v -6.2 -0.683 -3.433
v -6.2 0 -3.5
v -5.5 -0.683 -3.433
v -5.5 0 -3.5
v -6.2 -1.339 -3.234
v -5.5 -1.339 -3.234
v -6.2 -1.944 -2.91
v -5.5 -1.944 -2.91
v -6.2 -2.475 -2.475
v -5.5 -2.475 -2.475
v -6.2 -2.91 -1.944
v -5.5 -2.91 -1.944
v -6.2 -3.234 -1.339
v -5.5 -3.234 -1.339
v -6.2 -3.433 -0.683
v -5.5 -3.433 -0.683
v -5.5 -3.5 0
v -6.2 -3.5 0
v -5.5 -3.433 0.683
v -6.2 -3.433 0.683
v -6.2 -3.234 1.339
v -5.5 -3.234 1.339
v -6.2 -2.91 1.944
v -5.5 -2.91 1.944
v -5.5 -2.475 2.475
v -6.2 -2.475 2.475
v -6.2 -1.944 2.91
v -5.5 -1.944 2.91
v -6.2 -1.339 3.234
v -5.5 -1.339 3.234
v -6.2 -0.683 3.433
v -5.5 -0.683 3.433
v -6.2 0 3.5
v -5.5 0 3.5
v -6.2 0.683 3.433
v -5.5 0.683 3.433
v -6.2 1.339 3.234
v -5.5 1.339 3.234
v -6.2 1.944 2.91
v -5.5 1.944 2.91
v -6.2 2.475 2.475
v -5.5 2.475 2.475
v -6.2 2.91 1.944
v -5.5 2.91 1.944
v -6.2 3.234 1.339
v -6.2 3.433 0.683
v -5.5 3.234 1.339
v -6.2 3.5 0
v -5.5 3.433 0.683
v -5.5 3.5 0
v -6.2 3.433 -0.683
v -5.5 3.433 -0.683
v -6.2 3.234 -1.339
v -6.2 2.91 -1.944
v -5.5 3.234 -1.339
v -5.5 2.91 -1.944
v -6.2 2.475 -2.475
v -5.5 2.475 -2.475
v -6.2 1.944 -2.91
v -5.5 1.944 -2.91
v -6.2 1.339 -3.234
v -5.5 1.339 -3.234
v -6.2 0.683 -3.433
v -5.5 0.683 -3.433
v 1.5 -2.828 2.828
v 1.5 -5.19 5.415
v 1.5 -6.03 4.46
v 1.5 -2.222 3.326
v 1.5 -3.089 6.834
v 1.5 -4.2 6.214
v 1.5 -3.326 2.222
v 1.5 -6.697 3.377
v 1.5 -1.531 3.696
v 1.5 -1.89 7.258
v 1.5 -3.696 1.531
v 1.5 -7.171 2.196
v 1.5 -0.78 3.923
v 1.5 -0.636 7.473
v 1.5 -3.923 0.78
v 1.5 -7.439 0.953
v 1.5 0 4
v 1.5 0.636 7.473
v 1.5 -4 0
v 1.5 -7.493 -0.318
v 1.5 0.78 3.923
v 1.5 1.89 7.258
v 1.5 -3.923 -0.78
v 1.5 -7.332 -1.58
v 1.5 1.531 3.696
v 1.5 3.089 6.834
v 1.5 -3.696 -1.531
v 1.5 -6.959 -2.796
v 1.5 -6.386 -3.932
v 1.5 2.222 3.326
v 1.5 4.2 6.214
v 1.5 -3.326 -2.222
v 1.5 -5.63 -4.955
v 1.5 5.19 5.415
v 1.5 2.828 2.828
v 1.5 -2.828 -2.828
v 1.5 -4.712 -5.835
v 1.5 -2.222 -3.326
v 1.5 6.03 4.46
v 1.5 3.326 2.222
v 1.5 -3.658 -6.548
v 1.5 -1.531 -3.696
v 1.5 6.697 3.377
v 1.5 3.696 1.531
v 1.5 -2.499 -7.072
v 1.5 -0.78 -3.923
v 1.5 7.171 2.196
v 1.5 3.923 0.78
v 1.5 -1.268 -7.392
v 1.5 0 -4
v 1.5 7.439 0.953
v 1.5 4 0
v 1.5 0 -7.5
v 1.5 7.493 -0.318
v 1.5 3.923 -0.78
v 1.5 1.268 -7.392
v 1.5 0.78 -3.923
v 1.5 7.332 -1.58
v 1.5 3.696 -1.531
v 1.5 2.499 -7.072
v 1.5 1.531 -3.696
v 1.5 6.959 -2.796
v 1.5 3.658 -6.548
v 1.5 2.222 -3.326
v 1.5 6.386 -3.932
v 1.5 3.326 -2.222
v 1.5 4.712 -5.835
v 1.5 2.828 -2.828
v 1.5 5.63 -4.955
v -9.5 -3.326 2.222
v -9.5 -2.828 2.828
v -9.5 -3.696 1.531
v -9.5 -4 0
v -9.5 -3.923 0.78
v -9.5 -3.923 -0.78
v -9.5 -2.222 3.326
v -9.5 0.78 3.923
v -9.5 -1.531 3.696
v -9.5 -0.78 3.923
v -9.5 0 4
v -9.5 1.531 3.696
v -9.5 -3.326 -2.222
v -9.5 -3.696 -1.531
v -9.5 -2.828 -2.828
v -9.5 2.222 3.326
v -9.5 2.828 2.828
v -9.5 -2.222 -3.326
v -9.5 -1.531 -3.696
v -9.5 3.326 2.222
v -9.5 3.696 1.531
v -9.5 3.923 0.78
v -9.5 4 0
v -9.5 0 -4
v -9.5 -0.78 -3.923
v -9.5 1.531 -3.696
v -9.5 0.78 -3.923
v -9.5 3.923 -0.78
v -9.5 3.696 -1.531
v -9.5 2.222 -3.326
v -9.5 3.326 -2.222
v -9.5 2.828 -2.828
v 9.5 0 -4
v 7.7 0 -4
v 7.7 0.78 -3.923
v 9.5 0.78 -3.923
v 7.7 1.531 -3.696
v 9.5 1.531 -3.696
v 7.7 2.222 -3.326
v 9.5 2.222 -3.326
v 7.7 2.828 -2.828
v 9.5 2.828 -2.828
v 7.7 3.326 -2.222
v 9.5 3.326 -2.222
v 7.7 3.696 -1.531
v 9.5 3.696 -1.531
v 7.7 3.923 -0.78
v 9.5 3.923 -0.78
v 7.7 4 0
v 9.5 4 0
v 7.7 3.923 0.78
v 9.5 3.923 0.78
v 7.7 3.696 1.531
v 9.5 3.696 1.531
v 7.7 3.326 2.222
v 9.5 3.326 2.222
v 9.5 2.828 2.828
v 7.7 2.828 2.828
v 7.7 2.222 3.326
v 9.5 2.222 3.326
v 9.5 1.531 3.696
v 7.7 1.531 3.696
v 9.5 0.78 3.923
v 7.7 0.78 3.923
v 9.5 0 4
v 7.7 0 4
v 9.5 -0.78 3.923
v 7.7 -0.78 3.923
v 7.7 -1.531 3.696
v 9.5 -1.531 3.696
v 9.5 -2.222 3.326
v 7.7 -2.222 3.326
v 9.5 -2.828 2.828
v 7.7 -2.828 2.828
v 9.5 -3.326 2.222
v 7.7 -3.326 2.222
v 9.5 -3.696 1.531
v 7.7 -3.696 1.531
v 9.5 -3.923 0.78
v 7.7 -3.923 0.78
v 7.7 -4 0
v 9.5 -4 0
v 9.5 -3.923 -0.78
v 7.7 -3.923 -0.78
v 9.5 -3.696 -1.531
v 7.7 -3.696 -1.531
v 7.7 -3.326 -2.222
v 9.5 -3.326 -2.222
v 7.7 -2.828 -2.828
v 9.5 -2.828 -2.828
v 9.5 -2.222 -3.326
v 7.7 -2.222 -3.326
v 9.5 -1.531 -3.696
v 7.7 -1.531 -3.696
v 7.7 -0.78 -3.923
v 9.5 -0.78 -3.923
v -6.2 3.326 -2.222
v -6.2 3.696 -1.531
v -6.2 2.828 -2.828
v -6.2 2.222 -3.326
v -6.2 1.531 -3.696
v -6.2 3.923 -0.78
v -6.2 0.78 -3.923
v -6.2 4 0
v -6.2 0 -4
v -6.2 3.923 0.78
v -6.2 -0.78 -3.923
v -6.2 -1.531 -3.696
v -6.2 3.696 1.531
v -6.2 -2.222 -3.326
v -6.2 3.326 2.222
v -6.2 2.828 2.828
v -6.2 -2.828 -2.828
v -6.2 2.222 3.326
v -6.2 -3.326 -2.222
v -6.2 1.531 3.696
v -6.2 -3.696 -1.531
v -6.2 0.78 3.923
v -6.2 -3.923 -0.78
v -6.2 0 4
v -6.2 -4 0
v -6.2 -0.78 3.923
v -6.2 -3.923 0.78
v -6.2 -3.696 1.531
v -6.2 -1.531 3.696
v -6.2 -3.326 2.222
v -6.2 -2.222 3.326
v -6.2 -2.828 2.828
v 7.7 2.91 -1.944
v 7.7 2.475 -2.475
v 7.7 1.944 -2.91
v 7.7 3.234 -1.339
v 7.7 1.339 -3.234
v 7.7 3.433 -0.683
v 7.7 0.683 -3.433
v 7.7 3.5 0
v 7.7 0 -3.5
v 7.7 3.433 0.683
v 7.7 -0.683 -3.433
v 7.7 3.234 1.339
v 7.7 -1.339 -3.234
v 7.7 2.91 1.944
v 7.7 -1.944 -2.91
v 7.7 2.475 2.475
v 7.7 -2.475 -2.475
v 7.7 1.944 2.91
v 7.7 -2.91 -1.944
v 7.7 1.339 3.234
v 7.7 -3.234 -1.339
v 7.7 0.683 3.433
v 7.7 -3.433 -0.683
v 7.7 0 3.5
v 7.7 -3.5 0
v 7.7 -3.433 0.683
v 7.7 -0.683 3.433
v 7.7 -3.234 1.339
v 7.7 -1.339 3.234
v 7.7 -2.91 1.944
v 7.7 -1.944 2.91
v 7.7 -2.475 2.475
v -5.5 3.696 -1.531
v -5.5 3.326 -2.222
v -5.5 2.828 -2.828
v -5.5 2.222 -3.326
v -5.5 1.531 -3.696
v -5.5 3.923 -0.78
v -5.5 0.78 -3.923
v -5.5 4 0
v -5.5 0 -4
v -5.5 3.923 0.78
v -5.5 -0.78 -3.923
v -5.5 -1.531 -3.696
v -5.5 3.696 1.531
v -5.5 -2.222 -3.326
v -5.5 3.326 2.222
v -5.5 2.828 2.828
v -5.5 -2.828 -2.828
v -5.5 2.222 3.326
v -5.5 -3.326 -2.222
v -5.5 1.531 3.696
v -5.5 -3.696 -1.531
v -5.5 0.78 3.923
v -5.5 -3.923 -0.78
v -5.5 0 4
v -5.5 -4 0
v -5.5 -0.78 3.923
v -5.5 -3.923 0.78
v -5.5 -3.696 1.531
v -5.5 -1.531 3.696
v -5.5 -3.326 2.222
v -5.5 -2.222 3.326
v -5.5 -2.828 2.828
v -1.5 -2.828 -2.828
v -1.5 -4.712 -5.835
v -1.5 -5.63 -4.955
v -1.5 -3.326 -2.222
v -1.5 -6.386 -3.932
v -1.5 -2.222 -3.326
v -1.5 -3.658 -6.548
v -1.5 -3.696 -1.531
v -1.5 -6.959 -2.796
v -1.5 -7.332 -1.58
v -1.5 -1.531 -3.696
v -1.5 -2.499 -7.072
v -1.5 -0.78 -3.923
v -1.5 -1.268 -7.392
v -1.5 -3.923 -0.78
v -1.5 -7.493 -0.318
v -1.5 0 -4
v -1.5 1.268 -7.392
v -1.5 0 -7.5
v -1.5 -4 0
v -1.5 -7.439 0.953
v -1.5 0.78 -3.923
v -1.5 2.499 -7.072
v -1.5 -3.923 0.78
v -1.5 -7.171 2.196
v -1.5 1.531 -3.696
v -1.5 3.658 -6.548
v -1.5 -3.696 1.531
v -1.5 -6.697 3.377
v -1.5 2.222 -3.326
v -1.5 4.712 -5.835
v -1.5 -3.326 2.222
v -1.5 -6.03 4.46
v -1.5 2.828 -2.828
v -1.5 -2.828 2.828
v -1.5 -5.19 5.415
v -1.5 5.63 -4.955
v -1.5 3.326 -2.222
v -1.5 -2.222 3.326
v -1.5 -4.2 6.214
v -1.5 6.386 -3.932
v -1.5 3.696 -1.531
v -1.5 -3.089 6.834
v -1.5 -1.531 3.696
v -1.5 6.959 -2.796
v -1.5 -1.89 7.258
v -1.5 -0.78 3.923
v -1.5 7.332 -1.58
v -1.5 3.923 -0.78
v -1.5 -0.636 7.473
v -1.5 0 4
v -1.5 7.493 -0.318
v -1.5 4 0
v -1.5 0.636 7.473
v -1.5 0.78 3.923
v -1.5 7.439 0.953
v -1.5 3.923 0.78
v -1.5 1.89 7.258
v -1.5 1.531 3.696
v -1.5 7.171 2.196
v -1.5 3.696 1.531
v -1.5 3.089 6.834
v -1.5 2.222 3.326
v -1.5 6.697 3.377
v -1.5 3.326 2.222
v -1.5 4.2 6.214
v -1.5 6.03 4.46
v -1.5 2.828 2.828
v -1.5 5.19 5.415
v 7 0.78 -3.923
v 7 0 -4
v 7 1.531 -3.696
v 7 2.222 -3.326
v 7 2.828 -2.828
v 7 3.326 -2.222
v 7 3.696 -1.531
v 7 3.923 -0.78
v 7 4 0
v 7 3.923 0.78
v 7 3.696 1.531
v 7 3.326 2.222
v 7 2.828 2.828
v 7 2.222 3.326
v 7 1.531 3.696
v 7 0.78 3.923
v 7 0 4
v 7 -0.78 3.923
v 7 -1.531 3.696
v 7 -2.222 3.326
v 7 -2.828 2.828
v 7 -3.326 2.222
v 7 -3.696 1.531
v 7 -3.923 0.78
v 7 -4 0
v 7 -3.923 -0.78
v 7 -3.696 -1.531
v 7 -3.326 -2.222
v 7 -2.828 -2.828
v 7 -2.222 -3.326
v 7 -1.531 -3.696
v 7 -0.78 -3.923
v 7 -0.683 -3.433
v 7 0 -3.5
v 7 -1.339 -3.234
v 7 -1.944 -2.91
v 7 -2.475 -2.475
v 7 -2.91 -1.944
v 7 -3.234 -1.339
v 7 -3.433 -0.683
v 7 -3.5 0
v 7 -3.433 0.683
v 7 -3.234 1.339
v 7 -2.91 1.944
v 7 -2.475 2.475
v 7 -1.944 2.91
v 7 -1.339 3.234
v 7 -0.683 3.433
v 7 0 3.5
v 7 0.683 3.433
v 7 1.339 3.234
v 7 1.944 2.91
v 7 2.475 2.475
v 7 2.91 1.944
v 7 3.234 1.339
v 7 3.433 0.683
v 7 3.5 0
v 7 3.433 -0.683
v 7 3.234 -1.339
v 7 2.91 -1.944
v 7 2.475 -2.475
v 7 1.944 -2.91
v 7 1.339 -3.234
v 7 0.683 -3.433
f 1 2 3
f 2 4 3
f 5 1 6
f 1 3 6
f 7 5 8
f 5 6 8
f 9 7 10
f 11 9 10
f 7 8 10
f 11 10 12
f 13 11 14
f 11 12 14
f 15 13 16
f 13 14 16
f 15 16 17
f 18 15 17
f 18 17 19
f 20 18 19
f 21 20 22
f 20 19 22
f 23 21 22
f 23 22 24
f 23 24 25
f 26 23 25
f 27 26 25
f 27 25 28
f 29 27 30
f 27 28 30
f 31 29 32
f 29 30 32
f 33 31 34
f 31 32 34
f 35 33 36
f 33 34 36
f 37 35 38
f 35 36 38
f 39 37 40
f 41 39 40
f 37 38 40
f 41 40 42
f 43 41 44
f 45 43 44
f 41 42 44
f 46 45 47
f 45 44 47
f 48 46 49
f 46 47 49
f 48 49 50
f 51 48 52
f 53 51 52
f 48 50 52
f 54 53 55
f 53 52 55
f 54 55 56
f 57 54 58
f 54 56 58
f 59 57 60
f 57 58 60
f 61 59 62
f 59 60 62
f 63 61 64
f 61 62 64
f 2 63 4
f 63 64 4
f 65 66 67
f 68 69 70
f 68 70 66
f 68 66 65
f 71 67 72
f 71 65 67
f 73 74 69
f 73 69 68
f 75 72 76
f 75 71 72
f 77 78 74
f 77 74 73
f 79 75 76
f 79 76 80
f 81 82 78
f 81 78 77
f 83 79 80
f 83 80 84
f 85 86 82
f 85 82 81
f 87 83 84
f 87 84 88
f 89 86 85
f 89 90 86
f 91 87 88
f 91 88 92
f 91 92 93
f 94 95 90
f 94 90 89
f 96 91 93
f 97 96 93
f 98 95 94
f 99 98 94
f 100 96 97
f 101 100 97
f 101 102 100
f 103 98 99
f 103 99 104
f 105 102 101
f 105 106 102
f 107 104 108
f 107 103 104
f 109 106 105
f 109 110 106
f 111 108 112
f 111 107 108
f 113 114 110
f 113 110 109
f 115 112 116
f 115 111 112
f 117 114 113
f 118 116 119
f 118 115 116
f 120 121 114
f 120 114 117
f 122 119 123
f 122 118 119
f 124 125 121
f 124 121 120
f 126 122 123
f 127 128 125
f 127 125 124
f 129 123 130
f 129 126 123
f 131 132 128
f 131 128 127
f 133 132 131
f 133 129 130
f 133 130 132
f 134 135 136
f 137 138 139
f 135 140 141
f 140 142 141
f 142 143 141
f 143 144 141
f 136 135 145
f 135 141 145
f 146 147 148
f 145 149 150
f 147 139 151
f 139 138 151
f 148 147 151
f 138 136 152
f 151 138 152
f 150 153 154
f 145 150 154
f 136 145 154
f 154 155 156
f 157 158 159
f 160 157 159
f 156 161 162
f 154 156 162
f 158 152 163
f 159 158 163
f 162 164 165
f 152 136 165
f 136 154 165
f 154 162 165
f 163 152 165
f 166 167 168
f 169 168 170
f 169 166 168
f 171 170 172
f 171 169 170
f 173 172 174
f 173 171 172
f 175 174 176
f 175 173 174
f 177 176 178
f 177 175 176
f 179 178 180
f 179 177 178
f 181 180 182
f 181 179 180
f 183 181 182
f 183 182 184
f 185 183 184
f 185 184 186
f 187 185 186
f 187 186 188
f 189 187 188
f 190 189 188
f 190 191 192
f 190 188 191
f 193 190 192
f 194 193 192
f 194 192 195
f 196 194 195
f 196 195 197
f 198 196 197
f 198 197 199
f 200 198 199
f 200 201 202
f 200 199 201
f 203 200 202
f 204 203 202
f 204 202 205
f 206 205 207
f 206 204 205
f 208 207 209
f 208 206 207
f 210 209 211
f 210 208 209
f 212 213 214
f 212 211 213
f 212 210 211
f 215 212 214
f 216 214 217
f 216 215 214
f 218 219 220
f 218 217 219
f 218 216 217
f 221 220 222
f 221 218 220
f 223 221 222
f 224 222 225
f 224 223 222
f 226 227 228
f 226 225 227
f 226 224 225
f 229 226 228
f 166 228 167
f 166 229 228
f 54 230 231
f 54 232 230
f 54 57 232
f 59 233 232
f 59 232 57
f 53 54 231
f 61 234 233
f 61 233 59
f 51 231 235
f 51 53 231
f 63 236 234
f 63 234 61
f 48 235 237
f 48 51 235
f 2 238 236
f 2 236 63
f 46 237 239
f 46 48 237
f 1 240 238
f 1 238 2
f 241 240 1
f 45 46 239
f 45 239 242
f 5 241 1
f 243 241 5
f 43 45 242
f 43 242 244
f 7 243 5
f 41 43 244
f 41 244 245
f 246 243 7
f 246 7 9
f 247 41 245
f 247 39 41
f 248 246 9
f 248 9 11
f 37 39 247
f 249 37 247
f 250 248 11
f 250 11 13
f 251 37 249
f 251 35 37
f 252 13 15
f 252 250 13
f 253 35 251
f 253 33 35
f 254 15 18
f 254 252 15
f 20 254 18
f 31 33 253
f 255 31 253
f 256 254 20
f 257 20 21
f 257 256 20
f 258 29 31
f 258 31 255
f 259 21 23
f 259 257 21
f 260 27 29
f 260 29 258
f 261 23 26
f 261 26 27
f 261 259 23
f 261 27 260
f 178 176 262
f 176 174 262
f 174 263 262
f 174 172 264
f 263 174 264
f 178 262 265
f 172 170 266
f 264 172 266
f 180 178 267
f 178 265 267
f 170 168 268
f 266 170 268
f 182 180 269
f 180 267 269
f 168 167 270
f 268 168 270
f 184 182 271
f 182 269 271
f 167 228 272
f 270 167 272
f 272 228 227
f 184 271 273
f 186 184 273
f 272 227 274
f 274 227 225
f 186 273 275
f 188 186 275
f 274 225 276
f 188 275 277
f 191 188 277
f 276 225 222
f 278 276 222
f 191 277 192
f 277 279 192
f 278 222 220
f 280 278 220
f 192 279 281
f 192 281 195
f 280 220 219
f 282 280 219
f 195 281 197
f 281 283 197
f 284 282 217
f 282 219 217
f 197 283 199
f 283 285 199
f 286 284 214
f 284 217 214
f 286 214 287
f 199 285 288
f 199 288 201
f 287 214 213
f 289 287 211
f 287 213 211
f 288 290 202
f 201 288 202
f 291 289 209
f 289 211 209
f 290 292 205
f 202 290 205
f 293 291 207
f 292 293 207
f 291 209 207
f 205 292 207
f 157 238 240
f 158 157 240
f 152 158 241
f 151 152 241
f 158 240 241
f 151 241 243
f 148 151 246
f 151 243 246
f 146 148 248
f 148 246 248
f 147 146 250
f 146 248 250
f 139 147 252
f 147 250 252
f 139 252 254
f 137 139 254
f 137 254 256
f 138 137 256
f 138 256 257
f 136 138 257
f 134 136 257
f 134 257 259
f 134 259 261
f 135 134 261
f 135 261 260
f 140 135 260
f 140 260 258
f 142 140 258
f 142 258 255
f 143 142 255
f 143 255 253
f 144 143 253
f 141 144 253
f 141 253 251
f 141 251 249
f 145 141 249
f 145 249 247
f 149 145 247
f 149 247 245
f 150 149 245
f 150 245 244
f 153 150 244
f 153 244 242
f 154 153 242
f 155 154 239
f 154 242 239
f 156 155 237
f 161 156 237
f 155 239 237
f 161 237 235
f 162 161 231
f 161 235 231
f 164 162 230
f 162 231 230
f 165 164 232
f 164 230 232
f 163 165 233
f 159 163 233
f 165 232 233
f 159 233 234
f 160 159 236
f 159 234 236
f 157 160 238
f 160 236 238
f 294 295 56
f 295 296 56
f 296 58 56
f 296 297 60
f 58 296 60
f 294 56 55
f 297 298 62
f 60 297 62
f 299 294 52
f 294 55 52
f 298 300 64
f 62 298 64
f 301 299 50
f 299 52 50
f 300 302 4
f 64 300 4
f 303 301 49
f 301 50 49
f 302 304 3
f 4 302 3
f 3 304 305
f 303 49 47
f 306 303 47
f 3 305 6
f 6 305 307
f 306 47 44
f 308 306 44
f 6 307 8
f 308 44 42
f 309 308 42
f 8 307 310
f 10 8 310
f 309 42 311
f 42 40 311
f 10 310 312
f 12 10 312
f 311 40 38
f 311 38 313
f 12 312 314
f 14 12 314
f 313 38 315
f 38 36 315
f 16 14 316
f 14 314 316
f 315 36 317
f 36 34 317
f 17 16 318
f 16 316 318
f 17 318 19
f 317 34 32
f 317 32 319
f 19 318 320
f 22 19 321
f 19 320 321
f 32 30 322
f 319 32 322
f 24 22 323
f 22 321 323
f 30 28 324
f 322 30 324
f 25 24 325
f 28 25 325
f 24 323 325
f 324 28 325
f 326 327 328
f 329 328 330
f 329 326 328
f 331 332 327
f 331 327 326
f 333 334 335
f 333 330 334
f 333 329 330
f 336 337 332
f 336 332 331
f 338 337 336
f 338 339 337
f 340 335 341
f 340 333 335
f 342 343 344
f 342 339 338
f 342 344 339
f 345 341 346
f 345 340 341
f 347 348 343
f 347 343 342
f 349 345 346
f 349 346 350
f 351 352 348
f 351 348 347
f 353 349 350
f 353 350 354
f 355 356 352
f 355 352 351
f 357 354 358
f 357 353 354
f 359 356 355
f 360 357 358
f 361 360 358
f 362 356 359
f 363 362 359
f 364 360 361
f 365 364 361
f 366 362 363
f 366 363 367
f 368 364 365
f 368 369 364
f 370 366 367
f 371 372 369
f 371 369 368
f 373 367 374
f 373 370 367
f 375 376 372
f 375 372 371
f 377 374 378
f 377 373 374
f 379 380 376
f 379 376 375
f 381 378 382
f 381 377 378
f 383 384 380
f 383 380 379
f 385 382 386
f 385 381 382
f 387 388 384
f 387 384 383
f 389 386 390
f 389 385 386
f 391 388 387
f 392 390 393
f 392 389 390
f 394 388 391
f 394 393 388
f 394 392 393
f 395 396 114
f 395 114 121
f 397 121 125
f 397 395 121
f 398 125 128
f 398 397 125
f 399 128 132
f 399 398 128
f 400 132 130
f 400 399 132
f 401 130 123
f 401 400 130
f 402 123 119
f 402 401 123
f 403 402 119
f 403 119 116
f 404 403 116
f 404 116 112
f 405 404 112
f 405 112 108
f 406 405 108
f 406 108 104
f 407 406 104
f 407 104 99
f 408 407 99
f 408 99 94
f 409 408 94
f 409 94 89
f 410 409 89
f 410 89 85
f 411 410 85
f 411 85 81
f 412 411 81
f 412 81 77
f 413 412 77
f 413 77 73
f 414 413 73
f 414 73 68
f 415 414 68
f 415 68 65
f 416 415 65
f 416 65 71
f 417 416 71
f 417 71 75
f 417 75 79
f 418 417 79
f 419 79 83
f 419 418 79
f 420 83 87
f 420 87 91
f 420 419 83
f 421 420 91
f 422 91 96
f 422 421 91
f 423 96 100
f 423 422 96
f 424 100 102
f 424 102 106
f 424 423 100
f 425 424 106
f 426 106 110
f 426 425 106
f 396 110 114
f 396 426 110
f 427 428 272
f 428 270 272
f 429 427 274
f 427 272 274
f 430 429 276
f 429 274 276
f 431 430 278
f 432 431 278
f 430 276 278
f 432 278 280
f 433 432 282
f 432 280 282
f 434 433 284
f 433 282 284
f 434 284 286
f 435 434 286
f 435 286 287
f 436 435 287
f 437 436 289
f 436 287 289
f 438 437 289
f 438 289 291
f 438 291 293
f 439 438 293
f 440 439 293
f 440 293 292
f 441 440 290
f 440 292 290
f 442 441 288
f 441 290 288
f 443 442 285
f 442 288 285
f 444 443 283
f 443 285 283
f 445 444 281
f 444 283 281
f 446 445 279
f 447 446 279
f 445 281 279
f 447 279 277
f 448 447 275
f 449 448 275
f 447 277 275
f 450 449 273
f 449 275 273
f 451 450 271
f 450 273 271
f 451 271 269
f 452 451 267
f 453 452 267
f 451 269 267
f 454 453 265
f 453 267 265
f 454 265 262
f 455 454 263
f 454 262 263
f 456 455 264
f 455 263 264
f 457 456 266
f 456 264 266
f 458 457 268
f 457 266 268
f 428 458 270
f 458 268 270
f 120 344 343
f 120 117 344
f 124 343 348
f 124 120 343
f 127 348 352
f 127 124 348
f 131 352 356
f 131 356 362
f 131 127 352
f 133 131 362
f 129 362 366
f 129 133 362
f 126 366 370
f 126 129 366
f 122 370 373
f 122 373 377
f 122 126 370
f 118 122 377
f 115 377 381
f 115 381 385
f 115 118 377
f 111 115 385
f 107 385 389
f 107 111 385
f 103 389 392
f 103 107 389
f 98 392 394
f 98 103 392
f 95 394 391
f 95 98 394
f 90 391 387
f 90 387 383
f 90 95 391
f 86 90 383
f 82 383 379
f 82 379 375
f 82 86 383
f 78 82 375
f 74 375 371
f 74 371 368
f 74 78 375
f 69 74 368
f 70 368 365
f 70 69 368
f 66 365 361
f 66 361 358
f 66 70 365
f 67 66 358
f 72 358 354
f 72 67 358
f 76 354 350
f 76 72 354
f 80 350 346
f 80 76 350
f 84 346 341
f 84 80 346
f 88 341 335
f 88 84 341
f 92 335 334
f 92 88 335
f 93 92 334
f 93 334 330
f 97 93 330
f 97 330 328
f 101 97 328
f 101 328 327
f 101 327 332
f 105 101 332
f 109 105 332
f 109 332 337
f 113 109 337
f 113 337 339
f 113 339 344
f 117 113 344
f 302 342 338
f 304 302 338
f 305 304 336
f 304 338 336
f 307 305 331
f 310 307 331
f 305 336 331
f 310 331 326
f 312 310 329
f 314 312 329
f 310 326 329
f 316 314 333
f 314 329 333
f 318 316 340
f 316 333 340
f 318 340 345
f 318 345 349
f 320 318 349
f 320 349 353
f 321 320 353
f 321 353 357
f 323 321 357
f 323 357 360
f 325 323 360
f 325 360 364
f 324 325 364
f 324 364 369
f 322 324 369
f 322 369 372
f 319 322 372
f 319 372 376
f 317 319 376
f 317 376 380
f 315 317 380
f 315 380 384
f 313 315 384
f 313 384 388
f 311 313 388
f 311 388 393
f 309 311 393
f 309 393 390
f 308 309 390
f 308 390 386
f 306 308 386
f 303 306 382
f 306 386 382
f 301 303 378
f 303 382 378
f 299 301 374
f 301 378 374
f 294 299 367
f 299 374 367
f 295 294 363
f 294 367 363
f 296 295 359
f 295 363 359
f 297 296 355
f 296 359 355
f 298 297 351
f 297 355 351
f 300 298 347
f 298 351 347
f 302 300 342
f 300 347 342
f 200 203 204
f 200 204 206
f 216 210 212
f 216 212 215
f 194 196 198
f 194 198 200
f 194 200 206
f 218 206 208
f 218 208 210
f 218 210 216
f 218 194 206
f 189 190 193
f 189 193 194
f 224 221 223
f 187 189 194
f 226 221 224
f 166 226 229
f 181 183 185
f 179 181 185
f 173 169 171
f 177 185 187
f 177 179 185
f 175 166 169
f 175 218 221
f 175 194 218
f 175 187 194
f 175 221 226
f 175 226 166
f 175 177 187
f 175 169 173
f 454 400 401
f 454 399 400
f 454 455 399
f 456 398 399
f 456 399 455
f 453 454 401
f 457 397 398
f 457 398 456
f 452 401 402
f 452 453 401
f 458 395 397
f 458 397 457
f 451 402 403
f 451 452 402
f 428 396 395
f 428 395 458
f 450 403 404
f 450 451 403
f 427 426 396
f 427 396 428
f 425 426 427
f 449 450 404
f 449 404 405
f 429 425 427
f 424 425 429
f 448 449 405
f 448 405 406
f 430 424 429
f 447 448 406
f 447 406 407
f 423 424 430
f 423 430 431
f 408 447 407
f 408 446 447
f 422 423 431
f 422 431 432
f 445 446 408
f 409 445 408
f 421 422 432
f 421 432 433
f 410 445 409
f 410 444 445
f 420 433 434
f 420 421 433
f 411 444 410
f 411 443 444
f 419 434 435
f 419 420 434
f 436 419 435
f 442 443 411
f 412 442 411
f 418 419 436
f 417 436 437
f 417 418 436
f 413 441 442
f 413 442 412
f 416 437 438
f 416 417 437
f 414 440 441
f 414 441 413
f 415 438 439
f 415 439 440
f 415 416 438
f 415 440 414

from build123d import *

# Parameters (mm, degrees)
SCHIZZO1_R                   = 7.5
ESTRUSIONE_ESTRUSIONE1_DEPTH = 9.5
SCHIZZO3_R                   = 7.5
SCHIZZO3_R_2                 = 4
TAGLIO_ESTRUSIONE1_DEPTH     = 8
TAGLIO_ESTRUSIONE2_START     = -8
SCHIZZO5_R                   = 7.5
SCHIZZO5_R_2                 = 4
TAGLIO_ESTRUSIONE2_DEPTH     = 8
SCHIZZO4_W                   = 0.7
SCHIZZO4_H                   = 0.5


with BuildPart() as part:
    # Schizzo1 → Estrusione-Estrusione1 (new, symmetric)
    with BuildSketch(Plane(origin=(0, 0, 0), x_dir=(0, 0, -1), z_dir=(1, 0, 0))):
        Circle(SCHIZZO1_R)
    extrude(amount=ESTRUSIONE_ESTRUSIONE1_DEPTH, both=True)

    # Schizzo3 → Taglio-Estrusione1 (cut)
    with BuildSketch(Plane(origin=(9.5, 0, 0), x_dir=(0, 0, -1), z_dir=(1, 0, 0))):
        Circle(SCHIZZO3_R)
        Circle(SCHIZZO3_R_2, mode=Mode.SUBTRACT)
    extrude(amount=-TAGLIO_ESTRUSIONE1_DEPTH, mode=Mode.SUBTRACT)

    # Schizzo5 → Taglio-Estrusione2 (cut)
    with BuildSketch(Plane.ZY.offset(9.5).offset(TAGLIO_ESTRUSIONE2_START)):
        Circle(SCHIZZO5_R)
        with Locations(Location((0, 0, 0), (0, 0, 180))):
            Circle(SCHIZZO5_R_2, mode=Mode.SUBTRACT)
    extrude(amount=TAGLIO_ESTRUSIONE2_DEPTH, mode=Mode.SUBTRACT)

    # Schizzo4 → Taglia-Rivoluzione1 (revolve, cut)
    with BuildSketch(Plane.XY, mode=Mode.PRIVATE) as taglia_rivoluzione1_sk:
        with Locations((7.35, 3.75)):
            Rectangle(SCHIZZO4_W, SCHIZZO4_H)
        with Locations((-5.85, 3.75)):
            Rectangle(SCHIZZO4_W, SCHIZZO4_H)
    revolve(taglia_rivoluzione1_sk.sketch.rotate(Axis((0, 0, 0), (-1, 0, 0)), 90), axis=Axis((0, 0, 0), (-1, 0, 0)), mode=Mode.SUBTRACT)


solid = part.part
